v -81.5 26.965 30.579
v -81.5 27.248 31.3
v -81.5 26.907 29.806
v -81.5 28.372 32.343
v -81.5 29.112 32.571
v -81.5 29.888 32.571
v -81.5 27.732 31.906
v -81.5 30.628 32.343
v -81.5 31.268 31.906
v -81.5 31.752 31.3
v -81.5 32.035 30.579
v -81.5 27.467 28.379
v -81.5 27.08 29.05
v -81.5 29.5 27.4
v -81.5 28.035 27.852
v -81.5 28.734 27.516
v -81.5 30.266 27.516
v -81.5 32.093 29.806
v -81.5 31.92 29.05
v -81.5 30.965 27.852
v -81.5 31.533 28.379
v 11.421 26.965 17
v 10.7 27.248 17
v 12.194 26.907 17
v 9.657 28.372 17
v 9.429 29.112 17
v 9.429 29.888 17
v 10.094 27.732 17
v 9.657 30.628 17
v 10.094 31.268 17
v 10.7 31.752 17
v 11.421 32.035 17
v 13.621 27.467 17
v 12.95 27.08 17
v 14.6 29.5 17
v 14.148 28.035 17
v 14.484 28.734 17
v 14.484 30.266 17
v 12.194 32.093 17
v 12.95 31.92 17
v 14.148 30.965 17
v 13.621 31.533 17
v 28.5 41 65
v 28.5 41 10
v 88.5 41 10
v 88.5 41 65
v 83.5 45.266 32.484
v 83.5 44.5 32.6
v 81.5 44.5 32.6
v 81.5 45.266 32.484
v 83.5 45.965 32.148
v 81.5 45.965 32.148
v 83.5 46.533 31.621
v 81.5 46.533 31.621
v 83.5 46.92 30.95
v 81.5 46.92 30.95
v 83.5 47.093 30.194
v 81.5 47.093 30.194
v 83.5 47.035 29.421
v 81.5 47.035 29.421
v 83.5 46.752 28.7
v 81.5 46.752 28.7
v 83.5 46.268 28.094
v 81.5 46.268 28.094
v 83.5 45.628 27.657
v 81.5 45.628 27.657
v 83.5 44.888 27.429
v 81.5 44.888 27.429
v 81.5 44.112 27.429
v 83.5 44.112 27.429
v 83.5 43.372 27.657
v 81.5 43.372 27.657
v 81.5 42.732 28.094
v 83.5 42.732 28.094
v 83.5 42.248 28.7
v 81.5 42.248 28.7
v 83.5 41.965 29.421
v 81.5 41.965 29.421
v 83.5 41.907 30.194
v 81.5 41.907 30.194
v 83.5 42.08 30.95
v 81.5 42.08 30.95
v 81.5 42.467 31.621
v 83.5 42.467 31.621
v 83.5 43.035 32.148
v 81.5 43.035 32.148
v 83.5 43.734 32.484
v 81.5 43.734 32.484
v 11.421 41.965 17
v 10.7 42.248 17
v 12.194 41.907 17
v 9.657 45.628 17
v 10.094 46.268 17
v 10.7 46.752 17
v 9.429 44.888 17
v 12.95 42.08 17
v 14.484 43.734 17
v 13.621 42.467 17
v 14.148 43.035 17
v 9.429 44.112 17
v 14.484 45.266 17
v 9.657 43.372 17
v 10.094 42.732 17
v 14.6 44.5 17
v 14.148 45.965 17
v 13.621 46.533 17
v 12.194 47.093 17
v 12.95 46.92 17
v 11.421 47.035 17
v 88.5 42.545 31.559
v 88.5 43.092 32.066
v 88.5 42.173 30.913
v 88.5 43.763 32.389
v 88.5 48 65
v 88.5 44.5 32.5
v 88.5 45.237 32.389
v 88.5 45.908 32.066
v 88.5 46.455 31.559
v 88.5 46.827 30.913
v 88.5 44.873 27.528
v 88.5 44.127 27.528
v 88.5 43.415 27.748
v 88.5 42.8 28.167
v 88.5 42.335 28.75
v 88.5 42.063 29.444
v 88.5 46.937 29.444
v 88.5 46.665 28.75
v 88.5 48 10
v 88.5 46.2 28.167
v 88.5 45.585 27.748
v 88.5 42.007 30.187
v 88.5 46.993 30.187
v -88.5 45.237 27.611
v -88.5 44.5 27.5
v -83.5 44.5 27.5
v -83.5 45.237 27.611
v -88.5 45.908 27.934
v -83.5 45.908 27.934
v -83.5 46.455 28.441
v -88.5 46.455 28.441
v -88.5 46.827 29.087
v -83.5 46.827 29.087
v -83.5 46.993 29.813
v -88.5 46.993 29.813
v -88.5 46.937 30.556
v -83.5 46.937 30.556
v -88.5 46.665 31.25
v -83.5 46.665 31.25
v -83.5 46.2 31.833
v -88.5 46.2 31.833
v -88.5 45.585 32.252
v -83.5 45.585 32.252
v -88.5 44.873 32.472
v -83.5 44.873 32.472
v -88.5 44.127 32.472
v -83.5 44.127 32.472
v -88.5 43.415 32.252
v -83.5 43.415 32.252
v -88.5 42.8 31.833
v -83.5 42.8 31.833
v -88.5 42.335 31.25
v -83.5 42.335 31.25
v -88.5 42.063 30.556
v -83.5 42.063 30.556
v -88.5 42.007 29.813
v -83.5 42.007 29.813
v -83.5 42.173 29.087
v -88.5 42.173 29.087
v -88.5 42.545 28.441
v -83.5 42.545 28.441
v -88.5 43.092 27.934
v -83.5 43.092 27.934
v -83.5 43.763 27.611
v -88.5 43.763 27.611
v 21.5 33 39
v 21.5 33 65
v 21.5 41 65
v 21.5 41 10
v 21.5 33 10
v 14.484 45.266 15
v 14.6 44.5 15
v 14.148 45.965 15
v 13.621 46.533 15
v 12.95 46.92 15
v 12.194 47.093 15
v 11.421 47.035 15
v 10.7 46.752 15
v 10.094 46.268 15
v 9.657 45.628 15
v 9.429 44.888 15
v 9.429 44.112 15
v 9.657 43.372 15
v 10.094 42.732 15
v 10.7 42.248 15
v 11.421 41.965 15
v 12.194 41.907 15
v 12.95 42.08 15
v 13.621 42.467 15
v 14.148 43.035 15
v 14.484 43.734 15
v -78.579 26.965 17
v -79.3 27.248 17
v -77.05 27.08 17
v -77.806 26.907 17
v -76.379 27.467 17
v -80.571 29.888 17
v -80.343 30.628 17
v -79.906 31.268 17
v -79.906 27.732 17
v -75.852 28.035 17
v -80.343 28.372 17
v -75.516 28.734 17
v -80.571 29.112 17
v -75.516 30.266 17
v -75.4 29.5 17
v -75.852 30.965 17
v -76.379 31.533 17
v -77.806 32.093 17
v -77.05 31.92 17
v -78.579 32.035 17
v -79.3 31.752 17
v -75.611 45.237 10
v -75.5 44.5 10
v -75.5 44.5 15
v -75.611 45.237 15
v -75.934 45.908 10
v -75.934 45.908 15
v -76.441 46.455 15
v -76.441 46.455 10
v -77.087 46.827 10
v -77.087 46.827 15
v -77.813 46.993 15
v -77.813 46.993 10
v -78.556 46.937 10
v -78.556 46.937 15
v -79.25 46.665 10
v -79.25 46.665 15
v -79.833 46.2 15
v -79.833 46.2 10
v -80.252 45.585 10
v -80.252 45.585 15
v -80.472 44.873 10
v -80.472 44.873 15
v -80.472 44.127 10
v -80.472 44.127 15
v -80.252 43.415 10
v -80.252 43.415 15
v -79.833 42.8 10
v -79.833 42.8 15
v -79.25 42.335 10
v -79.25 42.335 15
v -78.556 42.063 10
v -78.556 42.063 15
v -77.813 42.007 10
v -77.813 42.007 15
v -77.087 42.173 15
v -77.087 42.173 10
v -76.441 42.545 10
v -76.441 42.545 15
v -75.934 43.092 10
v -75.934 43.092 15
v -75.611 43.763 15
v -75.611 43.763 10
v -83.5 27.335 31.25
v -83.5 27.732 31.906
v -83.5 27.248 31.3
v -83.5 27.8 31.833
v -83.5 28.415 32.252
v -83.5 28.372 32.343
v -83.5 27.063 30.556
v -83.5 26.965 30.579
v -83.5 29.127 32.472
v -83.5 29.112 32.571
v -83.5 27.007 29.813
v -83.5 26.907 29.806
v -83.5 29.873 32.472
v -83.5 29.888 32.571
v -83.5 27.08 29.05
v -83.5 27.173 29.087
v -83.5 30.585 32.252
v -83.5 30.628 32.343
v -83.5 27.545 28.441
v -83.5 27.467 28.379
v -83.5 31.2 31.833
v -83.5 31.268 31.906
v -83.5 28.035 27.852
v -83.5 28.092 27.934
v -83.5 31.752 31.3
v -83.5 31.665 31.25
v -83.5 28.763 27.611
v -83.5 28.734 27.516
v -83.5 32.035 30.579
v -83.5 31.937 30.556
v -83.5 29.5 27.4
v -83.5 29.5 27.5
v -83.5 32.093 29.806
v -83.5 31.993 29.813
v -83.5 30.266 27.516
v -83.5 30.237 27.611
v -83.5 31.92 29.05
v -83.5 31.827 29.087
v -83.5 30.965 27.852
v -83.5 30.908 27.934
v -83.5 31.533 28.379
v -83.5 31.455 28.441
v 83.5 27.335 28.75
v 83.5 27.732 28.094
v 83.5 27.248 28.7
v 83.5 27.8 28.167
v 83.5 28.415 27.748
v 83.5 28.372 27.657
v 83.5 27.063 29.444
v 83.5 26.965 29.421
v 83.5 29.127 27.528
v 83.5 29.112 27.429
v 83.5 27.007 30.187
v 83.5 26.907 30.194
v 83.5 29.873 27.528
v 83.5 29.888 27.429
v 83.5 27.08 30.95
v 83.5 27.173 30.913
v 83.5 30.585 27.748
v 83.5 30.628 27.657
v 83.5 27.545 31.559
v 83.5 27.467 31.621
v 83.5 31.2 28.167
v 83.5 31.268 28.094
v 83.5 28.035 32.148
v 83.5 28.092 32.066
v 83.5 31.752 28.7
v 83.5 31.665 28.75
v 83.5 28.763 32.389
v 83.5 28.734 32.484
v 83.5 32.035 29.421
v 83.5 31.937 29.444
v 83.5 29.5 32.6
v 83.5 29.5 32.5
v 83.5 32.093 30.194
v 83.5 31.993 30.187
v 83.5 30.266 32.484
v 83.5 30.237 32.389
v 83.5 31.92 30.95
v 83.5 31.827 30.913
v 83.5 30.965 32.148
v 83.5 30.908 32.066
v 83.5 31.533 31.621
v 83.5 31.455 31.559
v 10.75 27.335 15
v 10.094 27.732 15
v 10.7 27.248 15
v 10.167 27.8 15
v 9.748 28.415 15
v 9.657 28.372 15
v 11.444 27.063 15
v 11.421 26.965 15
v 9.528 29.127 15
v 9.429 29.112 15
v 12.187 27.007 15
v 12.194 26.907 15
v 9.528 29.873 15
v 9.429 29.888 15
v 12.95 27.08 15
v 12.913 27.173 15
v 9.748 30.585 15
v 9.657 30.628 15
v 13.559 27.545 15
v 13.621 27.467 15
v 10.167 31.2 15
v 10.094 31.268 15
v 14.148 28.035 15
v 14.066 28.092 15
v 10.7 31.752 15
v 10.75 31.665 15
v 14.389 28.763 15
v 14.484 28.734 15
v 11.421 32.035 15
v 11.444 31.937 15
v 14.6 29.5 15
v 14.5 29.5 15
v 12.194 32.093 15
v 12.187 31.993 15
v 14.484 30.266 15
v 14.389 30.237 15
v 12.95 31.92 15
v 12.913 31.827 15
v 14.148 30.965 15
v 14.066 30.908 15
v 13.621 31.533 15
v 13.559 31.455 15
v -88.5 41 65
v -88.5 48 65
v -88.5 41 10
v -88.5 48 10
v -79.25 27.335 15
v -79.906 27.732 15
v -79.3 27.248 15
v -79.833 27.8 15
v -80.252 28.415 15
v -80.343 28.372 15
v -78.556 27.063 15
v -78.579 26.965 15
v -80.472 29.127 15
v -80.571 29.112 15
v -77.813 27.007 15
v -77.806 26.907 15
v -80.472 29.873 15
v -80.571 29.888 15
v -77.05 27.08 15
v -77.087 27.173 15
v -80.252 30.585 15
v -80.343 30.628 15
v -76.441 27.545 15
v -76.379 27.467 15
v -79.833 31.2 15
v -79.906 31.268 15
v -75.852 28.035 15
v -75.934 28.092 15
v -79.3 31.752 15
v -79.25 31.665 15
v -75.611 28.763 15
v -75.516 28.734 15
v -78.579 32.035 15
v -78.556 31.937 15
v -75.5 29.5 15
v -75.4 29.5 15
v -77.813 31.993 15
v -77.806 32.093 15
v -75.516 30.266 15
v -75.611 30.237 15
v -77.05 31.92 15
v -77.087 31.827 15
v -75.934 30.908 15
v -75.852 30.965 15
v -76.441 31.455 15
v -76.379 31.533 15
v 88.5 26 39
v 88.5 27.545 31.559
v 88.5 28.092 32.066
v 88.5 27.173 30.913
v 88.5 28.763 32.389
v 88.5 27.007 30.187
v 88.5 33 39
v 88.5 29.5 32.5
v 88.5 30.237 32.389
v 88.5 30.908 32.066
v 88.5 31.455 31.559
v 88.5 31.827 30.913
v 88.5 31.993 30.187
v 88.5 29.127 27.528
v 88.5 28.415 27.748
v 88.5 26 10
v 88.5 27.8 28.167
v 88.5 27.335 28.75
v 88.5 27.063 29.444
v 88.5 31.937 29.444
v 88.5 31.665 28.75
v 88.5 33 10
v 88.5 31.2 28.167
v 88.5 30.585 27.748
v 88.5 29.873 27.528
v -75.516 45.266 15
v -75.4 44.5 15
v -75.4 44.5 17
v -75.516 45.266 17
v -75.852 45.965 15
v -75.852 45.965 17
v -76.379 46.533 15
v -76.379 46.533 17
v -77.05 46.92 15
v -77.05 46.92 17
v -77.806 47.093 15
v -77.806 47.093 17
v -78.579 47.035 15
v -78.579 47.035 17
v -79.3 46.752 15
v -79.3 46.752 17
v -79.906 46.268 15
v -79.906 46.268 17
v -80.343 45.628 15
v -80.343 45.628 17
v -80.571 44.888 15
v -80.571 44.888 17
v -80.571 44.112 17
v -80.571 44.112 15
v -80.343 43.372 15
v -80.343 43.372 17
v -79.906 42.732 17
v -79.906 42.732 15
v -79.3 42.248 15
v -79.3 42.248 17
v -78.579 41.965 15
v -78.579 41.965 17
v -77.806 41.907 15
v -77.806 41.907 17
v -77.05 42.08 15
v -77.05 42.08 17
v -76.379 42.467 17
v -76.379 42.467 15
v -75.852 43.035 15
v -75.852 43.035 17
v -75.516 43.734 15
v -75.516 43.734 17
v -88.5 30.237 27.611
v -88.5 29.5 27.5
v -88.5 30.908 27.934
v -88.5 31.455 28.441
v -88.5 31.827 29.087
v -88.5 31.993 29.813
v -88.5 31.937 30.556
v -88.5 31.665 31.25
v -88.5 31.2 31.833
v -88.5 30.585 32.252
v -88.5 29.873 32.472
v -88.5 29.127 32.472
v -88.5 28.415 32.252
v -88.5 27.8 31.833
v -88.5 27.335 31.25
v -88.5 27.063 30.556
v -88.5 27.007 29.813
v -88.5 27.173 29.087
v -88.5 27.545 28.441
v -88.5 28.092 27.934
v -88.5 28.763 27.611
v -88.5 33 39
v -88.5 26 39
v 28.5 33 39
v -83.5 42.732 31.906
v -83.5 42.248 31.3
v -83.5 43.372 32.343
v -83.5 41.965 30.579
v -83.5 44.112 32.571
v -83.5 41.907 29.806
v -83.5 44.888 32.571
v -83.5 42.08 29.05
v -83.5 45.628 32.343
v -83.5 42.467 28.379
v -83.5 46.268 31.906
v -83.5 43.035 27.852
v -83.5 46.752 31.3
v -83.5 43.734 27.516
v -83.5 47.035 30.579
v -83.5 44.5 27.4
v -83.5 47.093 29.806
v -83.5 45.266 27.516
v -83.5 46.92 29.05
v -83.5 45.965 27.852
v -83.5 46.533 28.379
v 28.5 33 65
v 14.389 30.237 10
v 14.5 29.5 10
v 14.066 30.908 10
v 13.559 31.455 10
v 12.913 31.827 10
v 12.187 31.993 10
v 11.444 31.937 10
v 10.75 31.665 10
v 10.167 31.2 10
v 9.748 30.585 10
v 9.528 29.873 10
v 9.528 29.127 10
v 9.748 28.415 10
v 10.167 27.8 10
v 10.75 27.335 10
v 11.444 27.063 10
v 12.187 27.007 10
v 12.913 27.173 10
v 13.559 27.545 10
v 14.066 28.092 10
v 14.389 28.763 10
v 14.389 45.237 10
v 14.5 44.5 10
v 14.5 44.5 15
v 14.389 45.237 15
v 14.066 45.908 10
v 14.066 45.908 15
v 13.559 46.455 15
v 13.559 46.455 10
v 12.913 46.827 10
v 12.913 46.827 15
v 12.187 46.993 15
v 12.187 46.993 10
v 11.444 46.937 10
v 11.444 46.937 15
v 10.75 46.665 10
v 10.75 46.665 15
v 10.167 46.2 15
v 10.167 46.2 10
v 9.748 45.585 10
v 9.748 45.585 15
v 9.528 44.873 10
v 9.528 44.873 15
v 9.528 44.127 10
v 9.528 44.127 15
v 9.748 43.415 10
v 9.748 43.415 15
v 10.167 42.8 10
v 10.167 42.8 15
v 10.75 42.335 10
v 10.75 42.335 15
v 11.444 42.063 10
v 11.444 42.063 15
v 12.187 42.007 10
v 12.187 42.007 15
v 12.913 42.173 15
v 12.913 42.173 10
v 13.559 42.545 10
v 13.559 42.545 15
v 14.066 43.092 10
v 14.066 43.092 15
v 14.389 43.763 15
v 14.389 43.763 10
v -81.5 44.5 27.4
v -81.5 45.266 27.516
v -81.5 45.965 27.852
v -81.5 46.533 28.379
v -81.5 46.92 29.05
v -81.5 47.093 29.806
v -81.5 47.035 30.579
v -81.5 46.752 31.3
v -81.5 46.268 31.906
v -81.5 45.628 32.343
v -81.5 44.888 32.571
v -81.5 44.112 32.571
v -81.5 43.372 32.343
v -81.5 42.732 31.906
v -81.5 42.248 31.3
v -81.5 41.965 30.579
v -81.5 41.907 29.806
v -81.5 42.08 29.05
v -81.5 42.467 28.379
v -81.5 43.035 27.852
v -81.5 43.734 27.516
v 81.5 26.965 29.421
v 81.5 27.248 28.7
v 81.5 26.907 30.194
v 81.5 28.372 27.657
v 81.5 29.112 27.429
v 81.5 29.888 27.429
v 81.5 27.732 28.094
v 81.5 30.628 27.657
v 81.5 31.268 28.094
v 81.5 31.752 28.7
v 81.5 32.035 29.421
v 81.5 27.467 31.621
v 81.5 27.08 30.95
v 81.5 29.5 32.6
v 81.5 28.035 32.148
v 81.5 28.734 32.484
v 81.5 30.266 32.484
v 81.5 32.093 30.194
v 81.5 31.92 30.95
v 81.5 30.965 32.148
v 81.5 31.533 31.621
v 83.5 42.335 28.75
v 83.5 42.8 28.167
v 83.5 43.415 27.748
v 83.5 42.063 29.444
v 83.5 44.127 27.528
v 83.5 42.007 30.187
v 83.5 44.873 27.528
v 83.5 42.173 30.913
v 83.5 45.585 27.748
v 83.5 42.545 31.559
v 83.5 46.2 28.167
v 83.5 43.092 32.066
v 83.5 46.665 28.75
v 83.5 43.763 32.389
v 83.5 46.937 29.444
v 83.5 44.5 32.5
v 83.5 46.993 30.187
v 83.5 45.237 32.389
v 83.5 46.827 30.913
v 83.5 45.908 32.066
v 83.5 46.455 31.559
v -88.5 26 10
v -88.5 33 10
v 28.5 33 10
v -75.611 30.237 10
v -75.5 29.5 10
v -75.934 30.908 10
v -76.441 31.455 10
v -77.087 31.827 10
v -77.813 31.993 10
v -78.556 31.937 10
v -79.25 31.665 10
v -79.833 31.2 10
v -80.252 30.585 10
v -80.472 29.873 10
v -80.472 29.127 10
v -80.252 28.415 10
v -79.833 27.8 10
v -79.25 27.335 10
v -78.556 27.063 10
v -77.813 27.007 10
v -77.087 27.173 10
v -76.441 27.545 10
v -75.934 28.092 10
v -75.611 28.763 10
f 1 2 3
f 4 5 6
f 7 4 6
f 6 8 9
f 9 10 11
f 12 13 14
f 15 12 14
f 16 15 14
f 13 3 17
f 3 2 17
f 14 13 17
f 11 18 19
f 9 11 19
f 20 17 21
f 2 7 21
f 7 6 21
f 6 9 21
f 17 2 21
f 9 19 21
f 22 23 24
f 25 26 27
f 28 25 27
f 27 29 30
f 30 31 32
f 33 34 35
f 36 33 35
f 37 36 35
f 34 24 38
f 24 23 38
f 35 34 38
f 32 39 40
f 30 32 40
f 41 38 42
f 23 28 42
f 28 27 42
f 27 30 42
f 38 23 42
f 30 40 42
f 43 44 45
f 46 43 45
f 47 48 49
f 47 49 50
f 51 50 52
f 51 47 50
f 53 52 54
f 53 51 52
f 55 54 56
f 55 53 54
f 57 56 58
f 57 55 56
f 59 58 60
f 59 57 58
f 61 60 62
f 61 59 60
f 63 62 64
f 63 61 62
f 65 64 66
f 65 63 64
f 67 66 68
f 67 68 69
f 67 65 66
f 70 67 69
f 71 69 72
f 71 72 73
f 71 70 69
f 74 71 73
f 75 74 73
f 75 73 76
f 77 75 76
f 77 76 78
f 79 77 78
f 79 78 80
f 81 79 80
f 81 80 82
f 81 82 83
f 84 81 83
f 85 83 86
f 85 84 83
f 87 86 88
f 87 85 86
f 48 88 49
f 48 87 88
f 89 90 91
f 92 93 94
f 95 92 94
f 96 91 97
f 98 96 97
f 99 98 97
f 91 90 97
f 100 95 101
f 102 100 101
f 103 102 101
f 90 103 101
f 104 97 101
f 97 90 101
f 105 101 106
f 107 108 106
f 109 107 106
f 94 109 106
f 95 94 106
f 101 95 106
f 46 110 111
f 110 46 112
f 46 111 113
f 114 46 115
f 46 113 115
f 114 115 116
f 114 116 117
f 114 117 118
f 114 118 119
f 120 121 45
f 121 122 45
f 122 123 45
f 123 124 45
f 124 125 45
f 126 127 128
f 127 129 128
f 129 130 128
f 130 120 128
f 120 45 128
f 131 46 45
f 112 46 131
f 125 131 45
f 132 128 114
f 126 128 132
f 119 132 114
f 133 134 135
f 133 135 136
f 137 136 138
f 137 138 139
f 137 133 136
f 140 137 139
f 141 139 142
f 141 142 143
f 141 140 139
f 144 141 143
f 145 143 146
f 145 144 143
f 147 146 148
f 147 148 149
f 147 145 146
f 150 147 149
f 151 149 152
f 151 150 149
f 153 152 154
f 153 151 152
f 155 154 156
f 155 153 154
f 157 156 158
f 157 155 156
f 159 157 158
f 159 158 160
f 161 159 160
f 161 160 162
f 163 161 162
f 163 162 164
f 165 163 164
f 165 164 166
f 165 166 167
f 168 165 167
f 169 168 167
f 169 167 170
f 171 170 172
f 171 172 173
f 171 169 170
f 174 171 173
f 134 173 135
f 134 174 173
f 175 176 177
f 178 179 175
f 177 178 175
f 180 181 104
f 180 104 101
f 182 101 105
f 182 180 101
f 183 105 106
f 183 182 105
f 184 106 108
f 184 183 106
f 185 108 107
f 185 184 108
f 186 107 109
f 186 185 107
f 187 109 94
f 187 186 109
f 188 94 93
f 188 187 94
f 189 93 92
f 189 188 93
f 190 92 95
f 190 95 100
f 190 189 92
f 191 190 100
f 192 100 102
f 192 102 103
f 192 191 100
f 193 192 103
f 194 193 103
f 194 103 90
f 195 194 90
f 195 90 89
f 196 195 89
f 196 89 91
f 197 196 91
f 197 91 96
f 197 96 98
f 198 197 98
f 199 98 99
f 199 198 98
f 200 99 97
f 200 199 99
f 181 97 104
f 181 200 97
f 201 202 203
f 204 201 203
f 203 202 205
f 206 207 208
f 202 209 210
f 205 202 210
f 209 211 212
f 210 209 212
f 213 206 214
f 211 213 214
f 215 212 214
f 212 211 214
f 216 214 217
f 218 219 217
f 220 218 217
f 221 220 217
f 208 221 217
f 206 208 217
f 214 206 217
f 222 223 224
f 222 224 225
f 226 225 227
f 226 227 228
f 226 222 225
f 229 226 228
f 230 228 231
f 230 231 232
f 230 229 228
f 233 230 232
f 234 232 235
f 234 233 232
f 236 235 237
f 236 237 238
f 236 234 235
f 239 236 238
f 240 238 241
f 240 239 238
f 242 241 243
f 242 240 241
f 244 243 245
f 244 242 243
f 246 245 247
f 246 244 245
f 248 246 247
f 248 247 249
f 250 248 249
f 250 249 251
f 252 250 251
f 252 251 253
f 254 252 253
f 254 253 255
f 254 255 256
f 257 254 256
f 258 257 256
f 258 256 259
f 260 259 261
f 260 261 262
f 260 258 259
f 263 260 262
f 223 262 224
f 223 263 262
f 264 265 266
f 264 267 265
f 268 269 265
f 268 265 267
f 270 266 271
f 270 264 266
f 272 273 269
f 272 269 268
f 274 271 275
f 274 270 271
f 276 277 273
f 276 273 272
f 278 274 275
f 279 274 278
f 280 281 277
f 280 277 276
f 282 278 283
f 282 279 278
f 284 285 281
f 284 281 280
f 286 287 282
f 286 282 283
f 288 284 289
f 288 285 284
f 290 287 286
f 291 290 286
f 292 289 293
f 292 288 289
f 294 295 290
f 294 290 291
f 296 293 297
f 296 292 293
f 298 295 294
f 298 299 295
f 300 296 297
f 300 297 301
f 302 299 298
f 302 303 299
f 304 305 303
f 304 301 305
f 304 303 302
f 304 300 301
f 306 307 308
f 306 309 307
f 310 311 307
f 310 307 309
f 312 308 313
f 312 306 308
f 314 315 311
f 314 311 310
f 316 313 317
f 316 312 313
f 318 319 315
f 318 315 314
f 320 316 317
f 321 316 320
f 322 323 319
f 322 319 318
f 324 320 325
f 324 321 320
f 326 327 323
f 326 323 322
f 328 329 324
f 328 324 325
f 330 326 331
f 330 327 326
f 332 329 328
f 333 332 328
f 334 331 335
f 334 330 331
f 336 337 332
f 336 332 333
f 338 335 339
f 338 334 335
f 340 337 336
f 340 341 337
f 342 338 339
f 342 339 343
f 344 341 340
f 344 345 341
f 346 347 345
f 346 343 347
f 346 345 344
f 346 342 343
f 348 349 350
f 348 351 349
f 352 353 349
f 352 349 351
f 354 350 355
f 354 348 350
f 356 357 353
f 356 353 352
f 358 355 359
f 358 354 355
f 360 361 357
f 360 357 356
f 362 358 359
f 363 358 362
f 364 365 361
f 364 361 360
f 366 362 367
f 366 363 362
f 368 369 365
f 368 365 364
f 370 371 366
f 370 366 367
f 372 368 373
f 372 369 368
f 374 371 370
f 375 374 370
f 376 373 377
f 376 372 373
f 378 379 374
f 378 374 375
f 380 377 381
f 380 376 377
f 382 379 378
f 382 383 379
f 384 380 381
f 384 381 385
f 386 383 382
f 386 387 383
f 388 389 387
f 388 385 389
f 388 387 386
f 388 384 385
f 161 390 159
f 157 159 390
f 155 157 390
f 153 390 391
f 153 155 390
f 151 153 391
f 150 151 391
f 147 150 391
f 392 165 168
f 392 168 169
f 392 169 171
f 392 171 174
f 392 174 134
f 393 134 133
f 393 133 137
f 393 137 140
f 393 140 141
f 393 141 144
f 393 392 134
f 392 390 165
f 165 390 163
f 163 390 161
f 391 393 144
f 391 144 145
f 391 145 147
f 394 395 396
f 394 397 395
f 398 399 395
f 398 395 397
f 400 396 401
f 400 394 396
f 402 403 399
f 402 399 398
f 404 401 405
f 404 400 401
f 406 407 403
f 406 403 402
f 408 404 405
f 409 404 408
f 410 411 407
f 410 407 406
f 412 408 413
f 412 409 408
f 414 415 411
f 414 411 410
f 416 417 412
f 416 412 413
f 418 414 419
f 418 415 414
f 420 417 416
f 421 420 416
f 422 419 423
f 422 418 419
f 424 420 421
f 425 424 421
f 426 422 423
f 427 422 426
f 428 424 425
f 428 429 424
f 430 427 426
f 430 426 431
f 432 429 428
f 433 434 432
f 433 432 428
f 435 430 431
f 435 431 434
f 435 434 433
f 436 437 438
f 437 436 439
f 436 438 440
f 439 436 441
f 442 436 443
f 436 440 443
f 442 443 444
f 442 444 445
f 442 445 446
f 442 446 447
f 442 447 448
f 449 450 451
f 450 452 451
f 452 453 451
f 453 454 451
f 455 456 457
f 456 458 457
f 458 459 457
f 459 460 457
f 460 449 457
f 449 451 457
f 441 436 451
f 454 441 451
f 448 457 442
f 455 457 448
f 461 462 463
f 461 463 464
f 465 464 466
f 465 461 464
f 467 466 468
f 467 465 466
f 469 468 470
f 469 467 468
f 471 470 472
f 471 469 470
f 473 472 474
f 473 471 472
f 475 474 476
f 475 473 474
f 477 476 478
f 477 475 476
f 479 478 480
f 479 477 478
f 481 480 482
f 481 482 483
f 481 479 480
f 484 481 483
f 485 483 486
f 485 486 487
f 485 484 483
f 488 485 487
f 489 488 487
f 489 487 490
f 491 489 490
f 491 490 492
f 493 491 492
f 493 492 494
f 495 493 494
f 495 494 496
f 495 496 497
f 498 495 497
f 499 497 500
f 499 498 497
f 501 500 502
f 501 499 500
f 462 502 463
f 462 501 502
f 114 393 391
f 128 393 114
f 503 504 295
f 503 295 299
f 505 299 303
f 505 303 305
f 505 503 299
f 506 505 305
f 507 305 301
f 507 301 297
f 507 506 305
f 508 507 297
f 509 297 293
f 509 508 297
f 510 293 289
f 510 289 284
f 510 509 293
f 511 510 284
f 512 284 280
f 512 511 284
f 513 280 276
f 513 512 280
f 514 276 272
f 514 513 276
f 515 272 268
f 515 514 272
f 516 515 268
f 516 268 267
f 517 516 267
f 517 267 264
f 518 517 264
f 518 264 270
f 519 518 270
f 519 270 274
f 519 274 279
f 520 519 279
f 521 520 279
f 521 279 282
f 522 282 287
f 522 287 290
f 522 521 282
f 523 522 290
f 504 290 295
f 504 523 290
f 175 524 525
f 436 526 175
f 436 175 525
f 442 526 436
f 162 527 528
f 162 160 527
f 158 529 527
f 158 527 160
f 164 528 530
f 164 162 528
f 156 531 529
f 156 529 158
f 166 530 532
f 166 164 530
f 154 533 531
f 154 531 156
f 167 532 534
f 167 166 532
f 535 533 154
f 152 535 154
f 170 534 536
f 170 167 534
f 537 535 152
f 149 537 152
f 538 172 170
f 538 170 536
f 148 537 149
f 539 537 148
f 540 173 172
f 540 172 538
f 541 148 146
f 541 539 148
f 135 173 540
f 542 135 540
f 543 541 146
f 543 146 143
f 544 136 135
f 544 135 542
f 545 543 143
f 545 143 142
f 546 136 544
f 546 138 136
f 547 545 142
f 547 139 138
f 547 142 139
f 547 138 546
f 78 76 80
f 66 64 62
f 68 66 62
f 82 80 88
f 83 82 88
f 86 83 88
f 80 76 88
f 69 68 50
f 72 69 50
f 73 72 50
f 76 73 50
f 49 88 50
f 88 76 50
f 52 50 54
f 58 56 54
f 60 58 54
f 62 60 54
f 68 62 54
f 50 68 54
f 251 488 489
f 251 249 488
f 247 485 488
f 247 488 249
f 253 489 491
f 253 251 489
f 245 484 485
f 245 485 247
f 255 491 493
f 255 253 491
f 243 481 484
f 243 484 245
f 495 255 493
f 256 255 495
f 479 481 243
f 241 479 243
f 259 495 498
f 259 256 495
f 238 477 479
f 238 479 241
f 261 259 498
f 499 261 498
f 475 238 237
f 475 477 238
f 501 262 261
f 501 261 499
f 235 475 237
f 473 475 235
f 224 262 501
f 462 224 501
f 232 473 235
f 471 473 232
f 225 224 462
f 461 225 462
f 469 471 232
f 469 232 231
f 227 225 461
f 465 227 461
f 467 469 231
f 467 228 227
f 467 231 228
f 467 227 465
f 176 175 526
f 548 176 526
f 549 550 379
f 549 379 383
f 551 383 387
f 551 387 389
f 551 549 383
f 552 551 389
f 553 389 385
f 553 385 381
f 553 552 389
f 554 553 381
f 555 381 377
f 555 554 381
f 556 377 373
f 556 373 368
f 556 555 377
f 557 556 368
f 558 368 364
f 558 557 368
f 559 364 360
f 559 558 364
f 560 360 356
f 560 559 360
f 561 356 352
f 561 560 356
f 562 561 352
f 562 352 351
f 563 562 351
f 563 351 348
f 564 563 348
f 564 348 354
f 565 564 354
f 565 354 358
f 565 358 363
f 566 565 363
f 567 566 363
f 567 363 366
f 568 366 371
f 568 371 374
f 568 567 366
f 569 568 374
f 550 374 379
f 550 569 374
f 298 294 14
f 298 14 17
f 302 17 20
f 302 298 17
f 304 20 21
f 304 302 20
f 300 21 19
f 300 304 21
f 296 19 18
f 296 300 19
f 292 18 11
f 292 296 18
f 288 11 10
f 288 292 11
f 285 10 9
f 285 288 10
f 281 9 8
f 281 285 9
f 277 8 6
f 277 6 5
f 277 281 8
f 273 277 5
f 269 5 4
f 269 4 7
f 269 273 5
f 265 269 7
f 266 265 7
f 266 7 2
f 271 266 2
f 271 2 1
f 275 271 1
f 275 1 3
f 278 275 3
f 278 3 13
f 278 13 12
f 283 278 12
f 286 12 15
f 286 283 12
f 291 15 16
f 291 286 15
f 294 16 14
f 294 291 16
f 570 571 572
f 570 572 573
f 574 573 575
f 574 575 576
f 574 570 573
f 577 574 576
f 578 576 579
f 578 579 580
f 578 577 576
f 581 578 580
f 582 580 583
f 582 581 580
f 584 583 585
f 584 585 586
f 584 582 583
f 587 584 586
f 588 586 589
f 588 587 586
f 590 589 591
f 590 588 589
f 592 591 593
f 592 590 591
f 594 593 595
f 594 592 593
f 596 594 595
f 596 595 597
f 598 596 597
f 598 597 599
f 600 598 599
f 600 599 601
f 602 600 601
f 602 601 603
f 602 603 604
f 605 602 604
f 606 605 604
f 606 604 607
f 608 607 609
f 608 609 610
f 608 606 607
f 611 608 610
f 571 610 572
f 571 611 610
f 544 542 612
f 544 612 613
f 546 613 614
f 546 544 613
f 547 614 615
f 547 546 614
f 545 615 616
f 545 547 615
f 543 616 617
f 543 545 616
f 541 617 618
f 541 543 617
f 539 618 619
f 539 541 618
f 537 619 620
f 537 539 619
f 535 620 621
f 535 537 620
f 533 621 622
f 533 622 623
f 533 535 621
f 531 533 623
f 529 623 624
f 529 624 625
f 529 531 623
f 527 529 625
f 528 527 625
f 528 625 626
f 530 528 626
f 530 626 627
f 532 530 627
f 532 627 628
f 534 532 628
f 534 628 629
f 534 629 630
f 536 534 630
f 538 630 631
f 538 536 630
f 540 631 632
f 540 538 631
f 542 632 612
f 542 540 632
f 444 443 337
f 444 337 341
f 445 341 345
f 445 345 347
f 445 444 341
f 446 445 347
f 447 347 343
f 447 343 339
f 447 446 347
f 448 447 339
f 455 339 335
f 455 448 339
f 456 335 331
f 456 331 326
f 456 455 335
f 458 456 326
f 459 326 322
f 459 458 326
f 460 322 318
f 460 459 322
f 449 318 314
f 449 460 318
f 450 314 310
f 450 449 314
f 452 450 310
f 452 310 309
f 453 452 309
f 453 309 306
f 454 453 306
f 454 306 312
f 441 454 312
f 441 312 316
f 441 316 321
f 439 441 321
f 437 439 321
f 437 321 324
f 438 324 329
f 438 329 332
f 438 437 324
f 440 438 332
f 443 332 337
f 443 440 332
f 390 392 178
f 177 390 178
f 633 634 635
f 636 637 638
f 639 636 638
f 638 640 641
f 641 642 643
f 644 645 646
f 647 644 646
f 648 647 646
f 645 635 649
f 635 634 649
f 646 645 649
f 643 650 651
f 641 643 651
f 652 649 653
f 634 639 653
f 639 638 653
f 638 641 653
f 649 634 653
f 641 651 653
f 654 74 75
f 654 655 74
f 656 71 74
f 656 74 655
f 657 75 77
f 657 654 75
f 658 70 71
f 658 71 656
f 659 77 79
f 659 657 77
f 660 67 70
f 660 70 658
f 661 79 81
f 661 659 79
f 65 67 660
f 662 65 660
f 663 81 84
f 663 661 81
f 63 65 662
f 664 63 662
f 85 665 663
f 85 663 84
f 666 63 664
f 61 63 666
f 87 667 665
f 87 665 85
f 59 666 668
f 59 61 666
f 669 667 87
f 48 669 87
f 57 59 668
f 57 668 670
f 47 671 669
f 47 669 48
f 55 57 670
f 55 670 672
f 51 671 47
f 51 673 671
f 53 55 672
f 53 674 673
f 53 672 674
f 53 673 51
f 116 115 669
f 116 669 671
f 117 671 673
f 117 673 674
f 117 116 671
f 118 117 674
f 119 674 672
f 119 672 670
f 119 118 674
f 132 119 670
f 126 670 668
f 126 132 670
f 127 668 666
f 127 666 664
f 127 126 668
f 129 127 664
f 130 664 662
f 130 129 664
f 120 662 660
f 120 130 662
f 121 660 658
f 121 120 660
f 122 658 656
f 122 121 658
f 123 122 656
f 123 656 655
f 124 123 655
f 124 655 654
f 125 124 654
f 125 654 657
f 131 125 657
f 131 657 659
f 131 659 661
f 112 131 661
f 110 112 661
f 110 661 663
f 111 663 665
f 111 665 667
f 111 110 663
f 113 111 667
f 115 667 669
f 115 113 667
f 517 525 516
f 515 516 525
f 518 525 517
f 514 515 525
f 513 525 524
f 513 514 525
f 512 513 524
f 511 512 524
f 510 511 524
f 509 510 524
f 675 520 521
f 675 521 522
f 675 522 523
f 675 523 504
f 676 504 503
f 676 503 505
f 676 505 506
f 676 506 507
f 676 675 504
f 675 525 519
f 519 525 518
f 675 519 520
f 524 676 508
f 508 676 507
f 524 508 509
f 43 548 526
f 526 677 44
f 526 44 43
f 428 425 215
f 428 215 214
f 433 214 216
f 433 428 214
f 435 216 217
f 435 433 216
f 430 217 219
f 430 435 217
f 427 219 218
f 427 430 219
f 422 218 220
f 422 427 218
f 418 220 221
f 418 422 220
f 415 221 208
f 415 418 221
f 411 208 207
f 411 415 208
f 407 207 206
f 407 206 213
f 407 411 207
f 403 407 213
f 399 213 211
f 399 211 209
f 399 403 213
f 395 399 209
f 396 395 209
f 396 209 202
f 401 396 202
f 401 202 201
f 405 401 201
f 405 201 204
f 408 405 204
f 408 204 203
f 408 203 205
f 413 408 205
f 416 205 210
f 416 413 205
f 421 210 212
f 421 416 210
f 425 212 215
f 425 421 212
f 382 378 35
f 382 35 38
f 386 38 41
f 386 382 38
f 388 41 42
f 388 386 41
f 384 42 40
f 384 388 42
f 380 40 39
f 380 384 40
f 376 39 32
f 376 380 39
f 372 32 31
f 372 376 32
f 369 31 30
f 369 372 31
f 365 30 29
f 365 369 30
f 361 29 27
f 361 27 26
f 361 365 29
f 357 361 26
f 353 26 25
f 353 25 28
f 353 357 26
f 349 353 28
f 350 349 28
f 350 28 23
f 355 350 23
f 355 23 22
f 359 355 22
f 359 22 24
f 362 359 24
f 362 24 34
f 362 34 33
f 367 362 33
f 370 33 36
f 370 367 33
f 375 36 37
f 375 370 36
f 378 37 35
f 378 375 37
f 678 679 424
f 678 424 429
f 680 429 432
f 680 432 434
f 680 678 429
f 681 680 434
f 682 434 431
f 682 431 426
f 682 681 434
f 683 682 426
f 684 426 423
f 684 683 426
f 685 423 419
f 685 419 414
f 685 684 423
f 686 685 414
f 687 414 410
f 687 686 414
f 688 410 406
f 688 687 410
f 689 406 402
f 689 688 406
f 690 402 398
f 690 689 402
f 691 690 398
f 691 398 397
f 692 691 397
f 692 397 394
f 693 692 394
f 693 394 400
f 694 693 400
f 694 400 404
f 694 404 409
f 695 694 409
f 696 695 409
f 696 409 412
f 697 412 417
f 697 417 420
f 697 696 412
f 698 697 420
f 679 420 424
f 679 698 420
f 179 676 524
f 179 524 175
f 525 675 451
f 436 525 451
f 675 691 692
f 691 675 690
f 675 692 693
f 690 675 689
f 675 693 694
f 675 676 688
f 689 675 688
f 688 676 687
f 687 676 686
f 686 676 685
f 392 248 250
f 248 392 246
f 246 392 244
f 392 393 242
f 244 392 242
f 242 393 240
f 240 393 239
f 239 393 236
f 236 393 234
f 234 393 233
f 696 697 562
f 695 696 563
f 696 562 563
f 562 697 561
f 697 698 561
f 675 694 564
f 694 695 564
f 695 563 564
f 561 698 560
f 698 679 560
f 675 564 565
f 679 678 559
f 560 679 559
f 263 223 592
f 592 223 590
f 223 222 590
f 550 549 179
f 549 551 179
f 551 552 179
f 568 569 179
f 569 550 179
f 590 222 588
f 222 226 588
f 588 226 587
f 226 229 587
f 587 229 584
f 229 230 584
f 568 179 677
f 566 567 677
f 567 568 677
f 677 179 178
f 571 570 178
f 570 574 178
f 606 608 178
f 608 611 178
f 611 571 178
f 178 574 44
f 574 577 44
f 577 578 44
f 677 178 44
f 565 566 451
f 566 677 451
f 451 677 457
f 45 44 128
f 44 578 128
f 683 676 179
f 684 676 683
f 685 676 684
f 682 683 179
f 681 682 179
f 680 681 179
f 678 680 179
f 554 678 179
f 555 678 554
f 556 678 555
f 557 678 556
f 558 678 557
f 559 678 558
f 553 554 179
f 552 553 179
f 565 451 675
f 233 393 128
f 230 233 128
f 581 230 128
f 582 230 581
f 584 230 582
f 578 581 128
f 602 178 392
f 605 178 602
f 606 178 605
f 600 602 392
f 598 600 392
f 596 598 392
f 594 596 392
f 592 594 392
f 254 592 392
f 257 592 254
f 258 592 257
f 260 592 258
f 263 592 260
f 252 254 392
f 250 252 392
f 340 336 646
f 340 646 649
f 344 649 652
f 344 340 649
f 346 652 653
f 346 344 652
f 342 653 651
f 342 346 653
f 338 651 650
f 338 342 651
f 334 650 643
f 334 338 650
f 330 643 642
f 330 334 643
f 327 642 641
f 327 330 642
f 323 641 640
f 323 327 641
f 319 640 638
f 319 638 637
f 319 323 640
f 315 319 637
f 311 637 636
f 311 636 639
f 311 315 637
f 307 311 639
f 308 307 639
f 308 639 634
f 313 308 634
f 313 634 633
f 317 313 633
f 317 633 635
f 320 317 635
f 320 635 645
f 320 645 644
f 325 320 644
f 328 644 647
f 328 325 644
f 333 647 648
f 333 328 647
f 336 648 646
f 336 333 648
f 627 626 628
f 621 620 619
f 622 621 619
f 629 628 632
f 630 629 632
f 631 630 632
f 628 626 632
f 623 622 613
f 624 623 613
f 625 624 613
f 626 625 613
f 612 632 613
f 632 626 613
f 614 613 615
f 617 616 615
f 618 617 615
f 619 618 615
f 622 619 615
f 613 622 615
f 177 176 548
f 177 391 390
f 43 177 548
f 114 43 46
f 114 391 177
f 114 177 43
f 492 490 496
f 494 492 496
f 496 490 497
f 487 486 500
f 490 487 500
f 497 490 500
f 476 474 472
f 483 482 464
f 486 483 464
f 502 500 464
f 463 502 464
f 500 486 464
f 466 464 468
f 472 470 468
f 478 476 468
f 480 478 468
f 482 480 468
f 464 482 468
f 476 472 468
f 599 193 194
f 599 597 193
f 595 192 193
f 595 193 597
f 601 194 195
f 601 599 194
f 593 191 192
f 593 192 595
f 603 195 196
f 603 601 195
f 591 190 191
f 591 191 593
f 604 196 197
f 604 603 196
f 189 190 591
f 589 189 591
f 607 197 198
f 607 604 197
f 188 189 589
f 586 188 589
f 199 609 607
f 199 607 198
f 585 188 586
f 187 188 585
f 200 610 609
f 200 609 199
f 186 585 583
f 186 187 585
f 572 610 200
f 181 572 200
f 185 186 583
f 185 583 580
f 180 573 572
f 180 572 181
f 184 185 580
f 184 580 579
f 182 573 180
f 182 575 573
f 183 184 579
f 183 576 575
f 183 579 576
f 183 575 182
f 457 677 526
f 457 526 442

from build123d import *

# Parameters (mm, degrees)
CYLINDER151_R             = 2.6
CYLINDER151_DEPTH         = 2
CYLINDER146_R             = 2.5
CYLINDER146_DEPTH         = 5
FUSION068_PLACEMENT_ANGLE = 90
CYLINDER143_R             = 2.6
CYLINDER143_DEPTH         = 2
CYLINDER142_R             = 2.5
CYLINDER142_DEPTH         = 5
FUSION067_PLACEMENT_ANGLE = 270
CYLINDER141_R             = 2.6
CYLINDER141_DEPTH         = 2
CYLINDER140_R             = 2.5
CYLINDER140_DEPTH         = 5
FUSION065_PLACEMENT_ANGLE = 90
CYLINDER133_R             = 2.6
CYLINDER133_DEPTH         = 2
CYLINDER132_R             = 2.5
CYLINDER132_DEPTH         = 5
CYLINDER135_R             = 2.6
CYLINDER135_DEPTH         = 2
CYLINDER136_R             = 2.5
CYLINDER136_DEPTH         = 5
CYLINDER131_R             = 2.6
CYLINDER131_DEPTH         = 2
CYLINDER130_R             = 2.5
CYLINDER130_DEPTH         = 5
CYLINDER134_R             = 2.6
CYLINDER134_DEPTH         = 2
CYLINDER137_R             = 2.5
CYLINDER137_DEPTH         = 5
CYLINDER150_R             = 2.6
CYLINDER150_DEPTH         = 2
CYLINDER149_R             = 2.5
CYLINDER149_DEPTH         = 5
FUSION069_PLACEMENT_ANGLE = 90
BOX030_W                  = 177
BOX030_H                  = 7
BOX030_DEPTH              = 29
BOX036_W                  = 7
BOX036_H                  = 15
BOX036_DEPTH              = 55
BOX031_W                  = 177
BOX031_H                  = 7
BOX031_DEPTH              = 55


with BuildPart() as cilindro151:
    # Cylinder151 → Cylinder151 (new body)
    with BuildSketch(Plane.XY.offset(5)):
        Circle(CYLINDER151_R)
    extrude(amount=CYLINDER151_DEPTH)


with BuildPart() as enganche_lego034:
    # Cylinder146 → Cylinder146 (new body)
    with BuildSketch(Plane.XY):
        Circle(CYLINDER146_R)
    extrude(amount=CYLINDER146_DEPTH)

    # Fusion068: union Cilindro151
    add(cilindro151.part)


with BuildPart() as enganche_lego034_1:
    # Fusion068 placement: moved
    add(enganche_lego034.part.moved(Location((88.5, 44.5, 30))).rotate(Axis((88.5, 44.5, 30), (0, -1, 0)), FUSION068_PLACEMENT_ANGLE))


with BuildPart() as cilindro143:
    # Cylinder143 → Cylinder143 (new body)
    with BuildSketch(Plane.XY.offset(5)):
        Circle(CYLINDER143_R)
    extrude(amount=CYLINDER143_DEPTH)


with BuildPart() as enganche_lego033:
    # Cylinder142 → Cylinder142 (new body)
    with BuildSketch(Plane.XY):
        Circle(CYLINDER142_R)
    extrude(amount=CYLINDER142_DEPTH)

    # Fusion067: union Cilindro143
    add(cilindro143.part)


with BuildPart() as enganche_lego033_1:
    # Fusion067 placement: moved
    add(enganche_lego033.part.moved(Location((88.5, 29.5, 30))).rotate(Axis((88.5, 29.5, 30), (0, 1, 0)), FUSION067_PLACEMENT_ANGLE))


with BuildPart() as cilindro141:
    # Cylinder141 → Cylinder141 (new body)
    with BuildSketch(Plane.XY.offset(5)):
        Circle(CYLINDER141_R)
    extrude(amount=CYLINDER141_DEPTH)


with BuildPart() as enganche_lego031:
    # Cylinder140 → Cylinder140 (new body)
    with BuildSketch(Plane.XY):
        Circle(CYLINDER140_R)
    extrude(amount=CYLINDER140_DEPTH)

    # Fusion065: union Cilindro141
    add(cilindro141.part)


with BuildPart() as enganche_lego031_1:
    # Fusion065 placement: moved
    add(enganche_lego031.part.moved(Location((-88.5, 29.5, 30))).rotate(Axis((-88.5, 29.5, 30), (0, 1, 0)), FUSION065_PLACEMENT_ANGLE))


with BuildPart() as cilindro133:
    # Cylinder133 → Cylinder133 (new body)
    with BuildSketch(Plane.XY.offset(5)):
        Circle(CYLINDER133_R)
    extrude(amount=CYLINDER133_DEPTH)


with BuildPart() as enganche_lego029:
    # Cylinder132 → Cylinder132 (new body)
    with BuildSketch(Plane.XY):
        Circle(CYLINDER132_R)
    extrude(amount=CYLINDER132_DEPTH)

    # Fusion063: union Cilindro133
    add(cilindro133.part)


with BuildPart() as enganche_lego029_1:
    # Fusion063 placement: moved
    add(enganche_lego029.part.moved(Location((-78, 29.5, 10))))


with BuildPart() as cilindro135:
    # Cylinder135 → Cylinder135 (new body)
    with BuildSketch(Plane.XY.offset(5)):
        Circle(CYLINDER135_R)
    extrude(amount=CYLINDER135_DEPTH)


with BuildPart() as enganche_lego028:
    # Cylinder136 → Cylinder136 (new body)
    with BuildSketch(Plane.XY):
        Circle(CYLINDER136_R)
    extrude(amount=CYLINDER136_DEPTH)

    # Fusion062: union Cilindro135
    add(cilindro135.part)


with BuildPart() as enganche_lego028_1:
    # Fusion062 placement: moved
    add(enganche_lego028.part.moved(Location((12, 44.5, 10))))


with BuildPart() as cilindro131:
    # Cylinder131 → Cylinder131 (new body)
    with BuildSketch(Plane.XY.offset(5)):
        Circle(CYLINDER131_R)
    extrude(amount=CYLINDER131_DEPTH)


with BuildPart() as enganche_lego026:
    # Cylinder130 → Cylinder130 (new body)
    with BuildSketch(Plane.XY):
        Circle(CYLINDER130_R)
    extrude(amount=CYLINDER130_DEPTH)

    # Fusion060: union Cilindro131
    add(cilindro131.part)


with BuildPart() as enganche_lego026_1:
    # Fusion060 placement: moved
    add(enganche_lego026.part.moved(Location((12, 29.5, 10))))


with BuildPart() as cilindro134:
    # Cylinder134 → Cylinder134 (new body)
    with BuildSketch(Plane.XY.offset(5)):
        Circle(CYLINDER134_R)
    extrude(amount=CYLINDER134_DEPTH)


with BuildPart() as enganche_lego027:
    # Cylinder137 → Cylinder137 (new body)
    with BuildSketch(Plane.XY):
        Circle(CYLINDER137_R)
    extrude(amount=CYLINDER137_DEPTH)

    # Fusion061: union Cilindro134
    add(cilindro134.part)


with BuildPart() as enganche_lego027_1:
    # Fusion061 placement: moved
    add(enganche_lego027.part.moved(Location((-78, 44.5, 10))))


with BuildPart() as cilindro150:
    # Cylinder150 → Cylinder150 (new body)
    with BuildSketch(Plane.XY.offset(5)):
        Circle(CYLINDER150_R)
    extrude(amount=CYLINDER150_DEPTH)


with BuildPart() as fusion073:
    # Cylinder149 → Cylinder149 (new body)
    with BuildSketch(Plane.XY):
        Circle(CYLINDER149_R)
    extrude(amount=CYLINDER149_DEPTH)

    # Fusion069: union Cilindro150
    add(cilindro150.part)


with BuildPart() as fusion073_1:
    # Fusion069 placement: moved
    add(fusion073.part.moved(Location((-88.5, 44.5, 30))).rotate(Axis((-88.5, 44.5, 30), (0, 1, 0)), FUSION069_PLACEMENT_ANGLE))

    # Fusion073: union enganche_lego034, enganche_lego033, enganche_lego031, enganche_lego029, enganche_lego028, enganche_lego026, enganche_lego027
    add(enganche_lego034_1.part)
    add(enganche_lego033_1.part)
    add(enganche_lego031_1.part)
    add(enganche_lego029_1.part)
    add(enganche_lego028_1.part)
    add(enganche_lego026_1.part)
    add(enganche_lego027_1.part)


with BuildPart() as cubo027:
    # Box030 → Box030 (new body)
    with BuildSketch(Plane(origin=(-88.5, 26, 10), x_dir=(1, 0, 0), z_dir=(0, 0, 1))):
        with Locations((88.5, 3.5)):
            Rectangle(BOX030_W, BOX030_H)
    extrude(amount=BOX030_DEPTH)


with BuildPart() as cubo033:
    # Box036 → Box036 (new body)
    with BuildSketch(Plane(origin=(21.5, 33, 10), x_dir=(1, 0, 0), z_dir=(0, 0, 1))):
        with Locations((3.5, 7.5)):
            Rectangle(BOX036_W, BOX036_H)
    extrude(amount=BOX036_DEPTH)


with BuildPart() as engranajesuj1:
    # Box031 → Box031 (new body)
    with BuildSketch(Plane(origin=(-88.5, 41, 10), x_dir=(1, 0, 0), z_dir=(0, 0, 1))):
        with Locations((88.5, 3.5)):
            Rectangle(BOX031_W, BOX031_H)
    extrude(amount=BOX031_DEPTH)

    # Fusion072: union Cubo027, Cubo033
    add(cubo027.part)
    add(cubo033.part)

    # Cut057: cut Fusion073
    add(fusion073_1.part, mode=Mode.SUBTRACT)


solid = engranajesuj1.part
